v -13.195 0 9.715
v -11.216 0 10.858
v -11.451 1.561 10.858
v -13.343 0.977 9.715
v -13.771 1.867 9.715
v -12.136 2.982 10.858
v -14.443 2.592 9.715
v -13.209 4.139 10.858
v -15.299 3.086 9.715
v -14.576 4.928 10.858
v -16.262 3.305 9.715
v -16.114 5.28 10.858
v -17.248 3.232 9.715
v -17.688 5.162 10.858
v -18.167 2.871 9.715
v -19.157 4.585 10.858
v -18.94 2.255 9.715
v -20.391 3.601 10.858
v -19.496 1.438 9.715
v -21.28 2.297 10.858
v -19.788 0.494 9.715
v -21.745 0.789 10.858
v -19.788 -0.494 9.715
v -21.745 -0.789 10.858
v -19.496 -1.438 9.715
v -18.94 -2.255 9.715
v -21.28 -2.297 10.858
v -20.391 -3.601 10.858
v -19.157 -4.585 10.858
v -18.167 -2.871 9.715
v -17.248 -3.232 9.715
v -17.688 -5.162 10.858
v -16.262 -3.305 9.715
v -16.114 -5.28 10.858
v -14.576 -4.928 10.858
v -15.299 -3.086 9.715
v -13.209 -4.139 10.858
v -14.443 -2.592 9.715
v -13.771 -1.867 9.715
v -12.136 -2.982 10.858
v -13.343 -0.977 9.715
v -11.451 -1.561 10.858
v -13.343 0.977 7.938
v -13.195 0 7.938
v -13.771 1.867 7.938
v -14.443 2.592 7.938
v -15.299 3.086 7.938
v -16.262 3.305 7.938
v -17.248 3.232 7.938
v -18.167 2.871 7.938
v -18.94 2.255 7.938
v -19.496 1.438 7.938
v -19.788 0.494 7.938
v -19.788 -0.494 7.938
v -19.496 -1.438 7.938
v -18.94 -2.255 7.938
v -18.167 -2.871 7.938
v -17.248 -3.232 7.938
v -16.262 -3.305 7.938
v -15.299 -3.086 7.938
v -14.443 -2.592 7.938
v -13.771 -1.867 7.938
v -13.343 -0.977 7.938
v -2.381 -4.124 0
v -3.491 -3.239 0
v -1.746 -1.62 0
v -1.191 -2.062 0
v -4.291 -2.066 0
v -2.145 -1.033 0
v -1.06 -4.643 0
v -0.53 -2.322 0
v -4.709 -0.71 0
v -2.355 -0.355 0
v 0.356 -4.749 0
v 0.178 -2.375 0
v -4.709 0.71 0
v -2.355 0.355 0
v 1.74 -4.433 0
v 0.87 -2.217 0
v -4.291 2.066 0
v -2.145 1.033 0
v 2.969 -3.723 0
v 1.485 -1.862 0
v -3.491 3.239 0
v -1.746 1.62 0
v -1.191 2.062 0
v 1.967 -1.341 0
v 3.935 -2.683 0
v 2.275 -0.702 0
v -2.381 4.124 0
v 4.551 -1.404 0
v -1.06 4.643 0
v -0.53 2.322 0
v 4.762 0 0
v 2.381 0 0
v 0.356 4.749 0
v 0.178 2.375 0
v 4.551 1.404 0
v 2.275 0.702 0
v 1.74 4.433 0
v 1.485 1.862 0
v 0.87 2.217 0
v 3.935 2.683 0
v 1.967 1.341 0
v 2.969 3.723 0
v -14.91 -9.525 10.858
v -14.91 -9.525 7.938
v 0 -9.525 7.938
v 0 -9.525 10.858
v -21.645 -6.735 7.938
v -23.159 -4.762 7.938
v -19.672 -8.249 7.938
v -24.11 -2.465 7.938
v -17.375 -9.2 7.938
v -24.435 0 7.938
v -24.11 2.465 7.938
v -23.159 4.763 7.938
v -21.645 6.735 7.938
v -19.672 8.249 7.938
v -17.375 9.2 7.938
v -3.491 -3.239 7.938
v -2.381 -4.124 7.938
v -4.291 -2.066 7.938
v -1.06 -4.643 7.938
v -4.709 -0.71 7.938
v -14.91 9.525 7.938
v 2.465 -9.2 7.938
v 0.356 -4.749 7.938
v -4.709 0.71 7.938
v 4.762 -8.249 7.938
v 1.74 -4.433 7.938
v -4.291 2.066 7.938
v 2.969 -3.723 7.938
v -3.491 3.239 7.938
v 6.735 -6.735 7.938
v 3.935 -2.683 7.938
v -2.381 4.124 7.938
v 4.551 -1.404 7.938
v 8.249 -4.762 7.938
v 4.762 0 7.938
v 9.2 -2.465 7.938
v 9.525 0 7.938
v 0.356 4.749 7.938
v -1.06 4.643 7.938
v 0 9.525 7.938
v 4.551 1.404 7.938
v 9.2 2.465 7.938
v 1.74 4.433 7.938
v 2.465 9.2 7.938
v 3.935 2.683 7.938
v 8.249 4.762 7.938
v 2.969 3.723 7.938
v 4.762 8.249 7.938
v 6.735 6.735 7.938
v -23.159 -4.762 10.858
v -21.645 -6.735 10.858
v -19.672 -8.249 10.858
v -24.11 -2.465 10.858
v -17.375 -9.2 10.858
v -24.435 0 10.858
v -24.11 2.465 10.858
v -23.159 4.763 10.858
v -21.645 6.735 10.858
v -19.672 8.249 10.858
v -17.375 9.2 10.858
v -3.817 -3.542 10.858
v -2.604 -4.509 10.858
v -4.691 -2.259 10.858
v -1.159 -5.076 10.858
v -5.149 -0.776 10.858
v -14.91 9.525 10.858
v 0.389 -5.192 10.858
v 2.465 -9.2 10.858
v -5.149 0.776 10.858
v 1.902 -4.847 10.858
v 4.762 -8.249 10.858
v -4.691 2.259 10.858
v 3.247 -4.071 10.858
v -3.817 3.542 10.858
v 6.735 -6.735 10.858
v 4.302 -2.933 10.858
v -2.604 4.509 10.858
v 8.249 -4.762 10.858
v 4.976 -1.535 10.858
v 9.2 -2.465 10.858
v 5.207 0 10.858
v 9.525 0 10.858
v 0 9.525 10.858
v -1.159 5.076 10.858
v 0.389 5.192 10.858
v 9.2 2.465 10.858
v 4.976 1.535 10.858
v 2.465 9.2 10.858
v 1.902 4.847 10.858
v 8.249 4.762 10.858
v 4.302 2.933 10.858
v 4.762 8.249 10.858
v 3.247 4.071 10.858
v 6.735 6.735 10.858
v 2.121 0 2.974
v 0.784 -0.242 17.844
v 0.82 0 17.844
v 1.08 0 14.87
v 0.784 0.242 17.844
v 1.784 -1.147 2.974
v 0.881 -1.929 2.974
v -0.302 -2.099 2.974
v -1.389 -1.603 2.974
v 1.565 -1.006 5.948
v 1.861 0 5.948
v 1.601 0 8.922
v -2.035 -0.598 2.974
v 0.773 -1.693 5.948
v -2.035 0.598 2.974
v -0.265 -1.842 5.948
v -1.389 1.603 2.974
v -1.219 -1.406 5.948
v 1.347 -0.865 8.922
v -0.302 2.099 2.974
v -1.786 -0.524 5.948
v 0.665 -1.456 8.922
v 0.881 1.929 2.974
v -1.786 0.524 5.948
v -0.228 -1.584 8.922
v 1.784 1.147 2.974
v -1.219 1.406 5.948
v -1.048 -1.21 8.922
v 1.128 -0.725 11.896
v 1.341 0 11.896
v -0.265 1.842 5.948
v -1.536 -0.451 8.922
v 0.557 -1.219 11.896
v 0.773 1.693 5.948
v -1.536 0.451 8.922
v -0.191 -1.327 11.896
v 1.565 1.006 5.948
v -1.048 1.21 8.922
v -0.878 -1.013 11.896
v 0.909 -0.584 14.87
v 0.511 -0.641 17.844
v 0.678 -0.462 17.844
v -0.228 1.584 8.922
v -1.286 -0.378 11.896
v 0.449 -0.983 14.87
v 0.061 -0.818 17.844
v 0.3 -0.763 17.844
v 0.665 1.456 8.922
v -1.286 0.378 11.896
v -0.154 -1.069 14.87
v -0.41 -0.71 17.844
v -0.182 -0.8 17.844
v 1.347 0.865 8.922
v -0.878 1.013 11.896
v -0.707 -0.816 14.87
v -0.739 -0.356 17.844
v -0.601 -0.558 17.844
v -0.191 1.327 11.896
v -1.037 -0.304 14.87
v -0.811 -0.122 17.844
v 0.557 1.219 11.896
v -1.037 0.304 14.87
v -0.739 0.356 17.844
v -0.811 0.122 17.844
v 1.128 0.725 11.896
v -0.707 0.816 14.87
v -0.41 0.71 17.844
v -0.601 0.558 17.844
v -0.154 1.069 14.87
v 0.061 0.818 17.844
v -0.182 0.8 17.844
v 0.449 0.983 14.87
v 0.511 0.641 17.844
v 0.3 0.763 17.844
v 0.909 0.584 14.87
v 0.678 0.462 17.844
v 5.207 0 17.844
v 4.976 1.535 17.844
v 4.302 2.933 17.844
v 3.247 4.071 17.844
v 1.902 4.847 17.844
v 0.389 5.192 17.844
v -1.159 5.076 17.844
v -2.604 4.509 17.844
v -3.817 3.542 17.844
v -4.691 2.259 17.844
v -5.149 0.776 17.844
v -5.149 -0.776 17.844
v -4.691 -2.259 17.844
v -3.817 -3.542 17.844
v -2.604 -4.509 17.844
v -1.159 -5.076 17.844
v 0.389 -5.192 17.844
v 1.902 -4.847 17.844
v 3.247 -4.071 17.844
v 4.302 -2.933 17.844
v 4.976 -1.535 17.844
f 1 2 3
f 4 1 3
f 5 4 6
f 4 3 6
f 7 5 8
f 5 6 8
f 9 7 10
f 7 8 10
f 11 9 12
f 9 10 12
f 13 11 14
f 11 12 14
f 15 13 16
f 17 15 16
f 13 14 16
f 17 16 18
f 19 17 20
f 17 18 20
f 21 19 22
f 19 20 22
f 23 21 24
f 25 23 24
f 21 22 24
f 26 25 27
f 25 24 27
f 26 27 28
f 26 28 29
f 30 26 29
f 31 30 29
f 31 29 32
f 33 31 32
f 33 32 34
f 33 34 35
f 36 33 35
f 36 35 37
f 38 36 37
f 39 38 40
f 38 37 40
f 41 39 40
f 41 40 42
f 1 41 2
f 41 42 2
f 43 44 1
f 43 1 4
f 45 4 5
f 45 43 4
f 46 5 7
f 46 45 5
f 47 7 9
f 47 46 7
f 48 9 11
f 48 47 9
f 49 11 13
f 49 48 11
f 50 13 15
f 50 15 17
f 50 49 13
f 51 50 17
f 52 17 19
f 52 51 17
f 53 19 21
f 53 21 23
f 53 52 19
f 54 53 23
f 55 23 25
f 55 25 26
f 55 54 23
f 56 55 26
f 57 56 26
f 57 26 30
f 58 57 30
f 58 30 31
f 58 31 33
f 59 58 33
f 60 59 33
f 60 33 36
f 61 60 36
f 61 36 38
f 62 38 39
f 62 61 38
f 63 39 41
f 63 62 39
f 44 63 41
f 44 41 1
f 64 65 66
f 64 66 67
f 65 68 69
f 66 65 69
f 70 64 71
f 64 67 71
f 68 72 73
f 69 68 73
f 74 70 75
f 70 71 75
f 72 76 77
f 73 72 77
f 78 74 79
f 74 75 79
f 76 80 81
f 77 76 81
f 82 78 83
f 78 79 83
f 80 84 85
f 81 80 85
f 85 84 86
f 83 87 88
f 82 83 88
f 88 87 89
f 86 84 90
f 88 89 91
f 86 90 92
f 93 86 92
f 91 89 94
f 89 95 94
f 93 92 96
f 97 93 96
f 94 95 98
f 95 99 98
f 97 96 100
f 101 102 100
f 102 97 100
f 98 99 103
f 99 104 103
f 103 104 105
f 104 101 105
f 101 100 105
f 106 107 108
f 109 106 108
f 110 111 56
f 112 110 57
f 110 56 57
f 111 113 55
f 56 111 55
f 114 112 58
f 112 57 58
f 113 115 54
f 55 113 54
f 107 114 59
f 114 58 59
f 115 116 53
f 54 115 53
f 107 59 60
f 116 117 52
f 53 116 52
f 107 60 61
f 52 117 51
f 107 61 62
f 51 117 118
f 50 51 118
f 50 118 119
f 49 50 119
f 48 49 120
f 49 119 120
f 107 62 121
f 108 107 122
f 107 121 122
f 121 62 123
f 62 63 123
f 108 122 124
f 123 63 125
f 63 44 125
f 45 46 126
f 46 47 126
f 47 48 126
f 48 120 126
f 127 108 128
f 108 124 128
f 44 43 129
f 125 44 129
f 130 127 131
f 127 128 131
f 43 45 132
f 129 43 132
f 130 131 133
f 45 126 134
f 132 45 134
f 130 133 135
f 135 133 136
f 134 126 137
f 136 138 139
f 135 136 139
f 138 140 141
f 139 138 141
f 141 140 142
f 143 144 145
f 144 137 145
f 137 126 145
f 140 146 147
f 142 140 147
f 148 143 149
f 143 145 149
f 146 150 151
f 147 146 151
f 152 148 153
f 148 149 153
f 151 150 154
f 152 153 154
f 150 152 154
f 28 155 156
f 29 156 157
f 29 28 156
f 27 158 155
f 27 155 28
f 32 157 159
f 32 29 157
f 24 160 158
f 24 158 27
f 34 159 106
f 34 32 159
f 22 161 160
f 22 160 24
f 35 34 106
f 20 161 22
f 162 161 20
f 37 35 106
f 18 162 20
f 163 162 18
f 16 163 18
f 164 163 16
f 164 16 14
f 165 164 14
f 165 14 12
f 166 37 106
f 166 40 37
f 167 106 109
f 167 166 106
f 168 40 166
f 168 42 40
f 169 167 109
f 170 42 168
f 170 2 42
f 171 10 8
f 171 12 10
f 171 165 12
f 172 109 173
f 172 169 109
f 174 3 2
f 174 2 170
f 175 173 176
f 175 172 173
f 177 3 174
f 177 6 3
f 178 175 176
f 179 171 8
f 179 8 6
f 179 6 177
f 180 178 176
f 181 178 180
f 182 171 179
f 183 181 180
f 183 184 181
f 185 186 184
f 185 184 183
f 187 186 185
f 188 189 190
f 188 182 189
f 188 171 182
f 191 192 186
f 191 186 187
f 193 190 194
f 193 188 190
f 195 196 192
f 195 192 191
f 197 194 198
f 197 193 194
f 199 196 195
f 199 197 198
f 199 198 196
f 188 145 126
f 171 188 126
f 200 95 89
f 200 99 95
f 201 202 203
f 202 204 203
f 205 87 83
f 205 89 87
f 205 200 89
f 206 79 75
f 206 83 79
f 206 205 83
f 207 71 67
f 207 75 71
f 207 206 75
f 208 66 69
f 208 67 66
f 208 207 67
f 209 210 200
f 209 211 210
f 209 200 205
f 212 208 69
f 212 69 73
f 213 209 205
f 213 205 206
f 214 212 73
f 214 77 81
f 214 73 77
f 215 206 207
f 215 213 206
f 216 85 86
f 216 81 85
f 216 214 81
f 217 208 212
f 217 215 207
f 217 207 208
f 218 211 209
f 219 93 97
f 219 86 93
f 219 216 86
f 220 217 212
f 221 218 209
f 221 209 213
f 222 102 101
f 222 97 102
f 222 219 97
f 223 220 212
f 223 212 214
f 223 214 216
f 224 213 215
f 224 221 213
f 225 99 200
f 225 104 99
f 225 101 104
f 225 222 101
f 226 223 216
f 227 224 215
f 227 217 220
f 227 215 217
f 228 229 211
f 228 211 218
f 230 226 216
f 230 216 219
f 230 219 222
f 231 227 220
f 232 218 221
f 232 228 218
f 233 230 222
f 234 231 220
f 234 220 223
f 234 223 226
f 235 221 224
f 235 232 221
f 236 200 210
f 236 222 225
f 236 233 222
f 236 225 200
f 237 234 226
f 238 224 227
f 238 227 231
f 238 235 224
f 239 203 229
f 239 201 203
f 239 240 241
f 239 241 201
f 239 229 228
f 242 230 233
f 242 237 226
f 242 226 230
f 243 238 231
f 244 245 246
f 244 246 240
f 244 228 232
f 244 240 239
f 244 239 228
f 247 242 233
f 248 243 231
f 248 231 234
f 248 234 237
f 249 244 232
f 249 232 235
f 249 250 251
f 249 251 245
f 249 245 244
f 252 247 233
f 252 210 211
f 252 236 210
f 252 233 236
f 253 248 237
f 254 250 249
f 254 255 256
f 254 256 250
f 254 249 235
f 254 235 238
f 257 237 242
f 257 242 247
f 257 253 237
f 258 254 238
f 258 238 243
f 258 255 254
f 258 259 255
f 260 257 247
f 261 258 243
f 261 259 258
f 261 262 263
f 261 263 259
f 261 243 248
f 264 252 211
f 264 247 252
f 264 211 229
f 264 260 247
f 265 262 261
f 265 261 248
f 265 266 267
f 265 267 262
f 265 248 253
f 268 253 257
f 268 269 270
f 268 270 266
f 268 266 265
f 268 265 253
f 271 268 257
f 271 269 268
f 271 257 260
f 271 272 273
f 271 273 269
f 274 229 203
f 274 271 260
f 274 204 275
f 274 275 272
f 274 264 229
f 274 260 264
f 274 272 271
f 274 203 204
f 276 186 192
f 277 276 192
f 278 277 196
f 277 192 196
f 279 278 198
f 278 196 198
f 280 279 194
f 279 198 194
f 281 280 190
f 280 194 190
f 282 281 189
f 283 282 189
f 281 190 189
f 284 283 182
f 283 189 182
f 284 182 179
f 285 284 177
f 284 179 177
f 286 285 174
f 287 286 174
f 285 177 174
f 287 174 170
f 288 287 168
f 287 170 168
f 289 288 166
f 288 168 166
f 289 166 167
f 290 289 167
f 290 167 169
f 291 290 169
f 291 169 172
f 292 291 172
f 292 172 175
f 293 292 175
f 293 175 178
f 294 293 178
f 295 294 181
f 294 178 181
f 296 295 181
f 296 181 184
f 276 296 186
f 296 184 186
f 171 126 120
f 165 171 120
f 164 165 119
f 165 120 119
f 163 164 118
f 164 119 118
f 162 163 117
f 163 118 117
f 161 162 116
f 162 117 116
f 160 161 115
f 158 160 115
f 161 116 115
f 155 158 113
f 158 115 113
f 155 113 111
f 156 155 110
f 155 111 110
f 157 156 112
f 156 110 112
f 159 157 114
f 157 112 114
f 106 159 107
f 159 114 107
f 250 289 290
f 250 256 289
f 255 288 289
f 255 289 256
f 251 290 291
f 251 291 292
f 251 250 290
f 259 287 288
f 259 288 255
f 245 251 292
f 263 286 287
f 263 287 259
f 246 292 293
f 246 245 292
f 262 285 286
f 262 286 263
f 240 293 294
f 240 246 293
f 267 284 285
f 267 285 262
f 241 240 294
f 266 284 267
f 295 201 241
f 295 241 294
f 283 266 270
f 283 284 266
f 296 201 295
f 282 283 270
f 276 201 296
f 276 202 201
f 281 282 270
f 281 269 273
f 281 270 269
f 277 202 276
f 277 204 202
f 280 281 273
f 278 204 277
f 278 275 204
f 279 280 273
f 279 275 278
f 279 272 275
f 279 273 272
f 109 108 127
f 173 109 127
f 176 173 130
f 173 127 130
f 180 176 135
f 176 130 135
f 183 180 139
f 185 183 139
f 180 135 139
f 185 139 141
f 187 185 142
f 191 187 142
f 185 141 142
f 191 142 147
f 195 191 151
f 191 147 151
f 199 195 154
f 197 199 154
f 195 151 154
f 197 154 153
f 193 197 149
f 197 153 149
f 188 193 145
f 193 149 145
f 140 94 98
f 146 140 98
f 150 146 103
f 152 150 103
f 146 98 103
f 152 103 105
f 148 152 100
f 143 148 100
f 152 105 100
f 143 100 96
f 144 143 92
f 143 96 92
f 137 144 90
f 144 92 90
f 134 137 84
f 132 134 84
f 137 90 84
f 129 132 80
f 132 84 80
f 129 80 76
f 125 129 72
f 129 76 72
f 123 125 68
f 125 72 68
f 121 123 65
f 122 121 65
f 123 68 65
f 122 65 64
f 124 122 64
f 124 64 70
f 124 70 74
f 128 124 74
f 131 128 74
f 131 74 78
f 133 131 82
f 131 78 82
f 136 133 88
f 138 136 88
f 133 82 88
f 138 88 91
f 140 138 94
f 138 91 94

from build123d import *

# Parameters (mm, degrees)
F0_R     = 4.7625
F1_DEPTH = 7.9375
F2_R     = 3.3147
F3_DEPTH = 2.921
F4_R     = 5.207
F5_DEPTH = 6.985
F6_SIZE2 = 1.9797340731
F6_SIZE  = 1.143
F7_R     = 2.38125
F8_DEPTH = 25.4
F8_TAPER = 5


with BuildPart() as f1:
    # F0 (on Top) → F1 (new body)
    with BuildSketch(Plane.XY):
        Circle(F0_R)
    extrude(amount=F1_DEPTH)

    # F2 (on face) → F3 (join)
    with BuildSketch(Plane.XY.offset(7.9375)):
        with BuildLine():
            Line((-14.9098, -9.525), (0, -9.525))
            ThreePointArc((0, -9.525), (9.525, 0), (0, 9.525))
            Line((0, 9.525), (-14.9098, 9.525))
            ThreePointArc((-14.9098, 9.525), (-24.4348, 0), (-14.9098, -9.525))
        make_face()
        with Locations((-16.51, 0)):
            Circle(F2_R, mode=Mode.SUBTRACT)
    extrude(amount=F3_DEPTH)

    # F4 (on face) → F5 (join)
    with BuildSketch(Plane.XY.offset(10.8585)):
        Circle(F4_R)
    extrude(amount=F5_DEPTH)

    # F6
    f6_edges = [f1.edges().sort_by_distance(p)[0] for p in [
        (-19.8247, 0, 10.8585),
    ]]
    f6_side = f1.faces().sort_by_distance((-19.8247, 0, 9.398))[0]
    chamfer(f6_edges, length=F6_SIZE, length2=F6_SIZE2, reference=f6_side)

    # F7 (on face) → F8 (cut)
    with BuildSketch(Plane(origin=(0, 0, 0), x_dir=(1, 0, 0), z_dir=(0, 0, -1))):
        Circle(F7_R)
    extrude(amount=-F8_DEPTH, taper=F8_TAPER, mode=Mode.SUBTRACT)


solid = f1.part
